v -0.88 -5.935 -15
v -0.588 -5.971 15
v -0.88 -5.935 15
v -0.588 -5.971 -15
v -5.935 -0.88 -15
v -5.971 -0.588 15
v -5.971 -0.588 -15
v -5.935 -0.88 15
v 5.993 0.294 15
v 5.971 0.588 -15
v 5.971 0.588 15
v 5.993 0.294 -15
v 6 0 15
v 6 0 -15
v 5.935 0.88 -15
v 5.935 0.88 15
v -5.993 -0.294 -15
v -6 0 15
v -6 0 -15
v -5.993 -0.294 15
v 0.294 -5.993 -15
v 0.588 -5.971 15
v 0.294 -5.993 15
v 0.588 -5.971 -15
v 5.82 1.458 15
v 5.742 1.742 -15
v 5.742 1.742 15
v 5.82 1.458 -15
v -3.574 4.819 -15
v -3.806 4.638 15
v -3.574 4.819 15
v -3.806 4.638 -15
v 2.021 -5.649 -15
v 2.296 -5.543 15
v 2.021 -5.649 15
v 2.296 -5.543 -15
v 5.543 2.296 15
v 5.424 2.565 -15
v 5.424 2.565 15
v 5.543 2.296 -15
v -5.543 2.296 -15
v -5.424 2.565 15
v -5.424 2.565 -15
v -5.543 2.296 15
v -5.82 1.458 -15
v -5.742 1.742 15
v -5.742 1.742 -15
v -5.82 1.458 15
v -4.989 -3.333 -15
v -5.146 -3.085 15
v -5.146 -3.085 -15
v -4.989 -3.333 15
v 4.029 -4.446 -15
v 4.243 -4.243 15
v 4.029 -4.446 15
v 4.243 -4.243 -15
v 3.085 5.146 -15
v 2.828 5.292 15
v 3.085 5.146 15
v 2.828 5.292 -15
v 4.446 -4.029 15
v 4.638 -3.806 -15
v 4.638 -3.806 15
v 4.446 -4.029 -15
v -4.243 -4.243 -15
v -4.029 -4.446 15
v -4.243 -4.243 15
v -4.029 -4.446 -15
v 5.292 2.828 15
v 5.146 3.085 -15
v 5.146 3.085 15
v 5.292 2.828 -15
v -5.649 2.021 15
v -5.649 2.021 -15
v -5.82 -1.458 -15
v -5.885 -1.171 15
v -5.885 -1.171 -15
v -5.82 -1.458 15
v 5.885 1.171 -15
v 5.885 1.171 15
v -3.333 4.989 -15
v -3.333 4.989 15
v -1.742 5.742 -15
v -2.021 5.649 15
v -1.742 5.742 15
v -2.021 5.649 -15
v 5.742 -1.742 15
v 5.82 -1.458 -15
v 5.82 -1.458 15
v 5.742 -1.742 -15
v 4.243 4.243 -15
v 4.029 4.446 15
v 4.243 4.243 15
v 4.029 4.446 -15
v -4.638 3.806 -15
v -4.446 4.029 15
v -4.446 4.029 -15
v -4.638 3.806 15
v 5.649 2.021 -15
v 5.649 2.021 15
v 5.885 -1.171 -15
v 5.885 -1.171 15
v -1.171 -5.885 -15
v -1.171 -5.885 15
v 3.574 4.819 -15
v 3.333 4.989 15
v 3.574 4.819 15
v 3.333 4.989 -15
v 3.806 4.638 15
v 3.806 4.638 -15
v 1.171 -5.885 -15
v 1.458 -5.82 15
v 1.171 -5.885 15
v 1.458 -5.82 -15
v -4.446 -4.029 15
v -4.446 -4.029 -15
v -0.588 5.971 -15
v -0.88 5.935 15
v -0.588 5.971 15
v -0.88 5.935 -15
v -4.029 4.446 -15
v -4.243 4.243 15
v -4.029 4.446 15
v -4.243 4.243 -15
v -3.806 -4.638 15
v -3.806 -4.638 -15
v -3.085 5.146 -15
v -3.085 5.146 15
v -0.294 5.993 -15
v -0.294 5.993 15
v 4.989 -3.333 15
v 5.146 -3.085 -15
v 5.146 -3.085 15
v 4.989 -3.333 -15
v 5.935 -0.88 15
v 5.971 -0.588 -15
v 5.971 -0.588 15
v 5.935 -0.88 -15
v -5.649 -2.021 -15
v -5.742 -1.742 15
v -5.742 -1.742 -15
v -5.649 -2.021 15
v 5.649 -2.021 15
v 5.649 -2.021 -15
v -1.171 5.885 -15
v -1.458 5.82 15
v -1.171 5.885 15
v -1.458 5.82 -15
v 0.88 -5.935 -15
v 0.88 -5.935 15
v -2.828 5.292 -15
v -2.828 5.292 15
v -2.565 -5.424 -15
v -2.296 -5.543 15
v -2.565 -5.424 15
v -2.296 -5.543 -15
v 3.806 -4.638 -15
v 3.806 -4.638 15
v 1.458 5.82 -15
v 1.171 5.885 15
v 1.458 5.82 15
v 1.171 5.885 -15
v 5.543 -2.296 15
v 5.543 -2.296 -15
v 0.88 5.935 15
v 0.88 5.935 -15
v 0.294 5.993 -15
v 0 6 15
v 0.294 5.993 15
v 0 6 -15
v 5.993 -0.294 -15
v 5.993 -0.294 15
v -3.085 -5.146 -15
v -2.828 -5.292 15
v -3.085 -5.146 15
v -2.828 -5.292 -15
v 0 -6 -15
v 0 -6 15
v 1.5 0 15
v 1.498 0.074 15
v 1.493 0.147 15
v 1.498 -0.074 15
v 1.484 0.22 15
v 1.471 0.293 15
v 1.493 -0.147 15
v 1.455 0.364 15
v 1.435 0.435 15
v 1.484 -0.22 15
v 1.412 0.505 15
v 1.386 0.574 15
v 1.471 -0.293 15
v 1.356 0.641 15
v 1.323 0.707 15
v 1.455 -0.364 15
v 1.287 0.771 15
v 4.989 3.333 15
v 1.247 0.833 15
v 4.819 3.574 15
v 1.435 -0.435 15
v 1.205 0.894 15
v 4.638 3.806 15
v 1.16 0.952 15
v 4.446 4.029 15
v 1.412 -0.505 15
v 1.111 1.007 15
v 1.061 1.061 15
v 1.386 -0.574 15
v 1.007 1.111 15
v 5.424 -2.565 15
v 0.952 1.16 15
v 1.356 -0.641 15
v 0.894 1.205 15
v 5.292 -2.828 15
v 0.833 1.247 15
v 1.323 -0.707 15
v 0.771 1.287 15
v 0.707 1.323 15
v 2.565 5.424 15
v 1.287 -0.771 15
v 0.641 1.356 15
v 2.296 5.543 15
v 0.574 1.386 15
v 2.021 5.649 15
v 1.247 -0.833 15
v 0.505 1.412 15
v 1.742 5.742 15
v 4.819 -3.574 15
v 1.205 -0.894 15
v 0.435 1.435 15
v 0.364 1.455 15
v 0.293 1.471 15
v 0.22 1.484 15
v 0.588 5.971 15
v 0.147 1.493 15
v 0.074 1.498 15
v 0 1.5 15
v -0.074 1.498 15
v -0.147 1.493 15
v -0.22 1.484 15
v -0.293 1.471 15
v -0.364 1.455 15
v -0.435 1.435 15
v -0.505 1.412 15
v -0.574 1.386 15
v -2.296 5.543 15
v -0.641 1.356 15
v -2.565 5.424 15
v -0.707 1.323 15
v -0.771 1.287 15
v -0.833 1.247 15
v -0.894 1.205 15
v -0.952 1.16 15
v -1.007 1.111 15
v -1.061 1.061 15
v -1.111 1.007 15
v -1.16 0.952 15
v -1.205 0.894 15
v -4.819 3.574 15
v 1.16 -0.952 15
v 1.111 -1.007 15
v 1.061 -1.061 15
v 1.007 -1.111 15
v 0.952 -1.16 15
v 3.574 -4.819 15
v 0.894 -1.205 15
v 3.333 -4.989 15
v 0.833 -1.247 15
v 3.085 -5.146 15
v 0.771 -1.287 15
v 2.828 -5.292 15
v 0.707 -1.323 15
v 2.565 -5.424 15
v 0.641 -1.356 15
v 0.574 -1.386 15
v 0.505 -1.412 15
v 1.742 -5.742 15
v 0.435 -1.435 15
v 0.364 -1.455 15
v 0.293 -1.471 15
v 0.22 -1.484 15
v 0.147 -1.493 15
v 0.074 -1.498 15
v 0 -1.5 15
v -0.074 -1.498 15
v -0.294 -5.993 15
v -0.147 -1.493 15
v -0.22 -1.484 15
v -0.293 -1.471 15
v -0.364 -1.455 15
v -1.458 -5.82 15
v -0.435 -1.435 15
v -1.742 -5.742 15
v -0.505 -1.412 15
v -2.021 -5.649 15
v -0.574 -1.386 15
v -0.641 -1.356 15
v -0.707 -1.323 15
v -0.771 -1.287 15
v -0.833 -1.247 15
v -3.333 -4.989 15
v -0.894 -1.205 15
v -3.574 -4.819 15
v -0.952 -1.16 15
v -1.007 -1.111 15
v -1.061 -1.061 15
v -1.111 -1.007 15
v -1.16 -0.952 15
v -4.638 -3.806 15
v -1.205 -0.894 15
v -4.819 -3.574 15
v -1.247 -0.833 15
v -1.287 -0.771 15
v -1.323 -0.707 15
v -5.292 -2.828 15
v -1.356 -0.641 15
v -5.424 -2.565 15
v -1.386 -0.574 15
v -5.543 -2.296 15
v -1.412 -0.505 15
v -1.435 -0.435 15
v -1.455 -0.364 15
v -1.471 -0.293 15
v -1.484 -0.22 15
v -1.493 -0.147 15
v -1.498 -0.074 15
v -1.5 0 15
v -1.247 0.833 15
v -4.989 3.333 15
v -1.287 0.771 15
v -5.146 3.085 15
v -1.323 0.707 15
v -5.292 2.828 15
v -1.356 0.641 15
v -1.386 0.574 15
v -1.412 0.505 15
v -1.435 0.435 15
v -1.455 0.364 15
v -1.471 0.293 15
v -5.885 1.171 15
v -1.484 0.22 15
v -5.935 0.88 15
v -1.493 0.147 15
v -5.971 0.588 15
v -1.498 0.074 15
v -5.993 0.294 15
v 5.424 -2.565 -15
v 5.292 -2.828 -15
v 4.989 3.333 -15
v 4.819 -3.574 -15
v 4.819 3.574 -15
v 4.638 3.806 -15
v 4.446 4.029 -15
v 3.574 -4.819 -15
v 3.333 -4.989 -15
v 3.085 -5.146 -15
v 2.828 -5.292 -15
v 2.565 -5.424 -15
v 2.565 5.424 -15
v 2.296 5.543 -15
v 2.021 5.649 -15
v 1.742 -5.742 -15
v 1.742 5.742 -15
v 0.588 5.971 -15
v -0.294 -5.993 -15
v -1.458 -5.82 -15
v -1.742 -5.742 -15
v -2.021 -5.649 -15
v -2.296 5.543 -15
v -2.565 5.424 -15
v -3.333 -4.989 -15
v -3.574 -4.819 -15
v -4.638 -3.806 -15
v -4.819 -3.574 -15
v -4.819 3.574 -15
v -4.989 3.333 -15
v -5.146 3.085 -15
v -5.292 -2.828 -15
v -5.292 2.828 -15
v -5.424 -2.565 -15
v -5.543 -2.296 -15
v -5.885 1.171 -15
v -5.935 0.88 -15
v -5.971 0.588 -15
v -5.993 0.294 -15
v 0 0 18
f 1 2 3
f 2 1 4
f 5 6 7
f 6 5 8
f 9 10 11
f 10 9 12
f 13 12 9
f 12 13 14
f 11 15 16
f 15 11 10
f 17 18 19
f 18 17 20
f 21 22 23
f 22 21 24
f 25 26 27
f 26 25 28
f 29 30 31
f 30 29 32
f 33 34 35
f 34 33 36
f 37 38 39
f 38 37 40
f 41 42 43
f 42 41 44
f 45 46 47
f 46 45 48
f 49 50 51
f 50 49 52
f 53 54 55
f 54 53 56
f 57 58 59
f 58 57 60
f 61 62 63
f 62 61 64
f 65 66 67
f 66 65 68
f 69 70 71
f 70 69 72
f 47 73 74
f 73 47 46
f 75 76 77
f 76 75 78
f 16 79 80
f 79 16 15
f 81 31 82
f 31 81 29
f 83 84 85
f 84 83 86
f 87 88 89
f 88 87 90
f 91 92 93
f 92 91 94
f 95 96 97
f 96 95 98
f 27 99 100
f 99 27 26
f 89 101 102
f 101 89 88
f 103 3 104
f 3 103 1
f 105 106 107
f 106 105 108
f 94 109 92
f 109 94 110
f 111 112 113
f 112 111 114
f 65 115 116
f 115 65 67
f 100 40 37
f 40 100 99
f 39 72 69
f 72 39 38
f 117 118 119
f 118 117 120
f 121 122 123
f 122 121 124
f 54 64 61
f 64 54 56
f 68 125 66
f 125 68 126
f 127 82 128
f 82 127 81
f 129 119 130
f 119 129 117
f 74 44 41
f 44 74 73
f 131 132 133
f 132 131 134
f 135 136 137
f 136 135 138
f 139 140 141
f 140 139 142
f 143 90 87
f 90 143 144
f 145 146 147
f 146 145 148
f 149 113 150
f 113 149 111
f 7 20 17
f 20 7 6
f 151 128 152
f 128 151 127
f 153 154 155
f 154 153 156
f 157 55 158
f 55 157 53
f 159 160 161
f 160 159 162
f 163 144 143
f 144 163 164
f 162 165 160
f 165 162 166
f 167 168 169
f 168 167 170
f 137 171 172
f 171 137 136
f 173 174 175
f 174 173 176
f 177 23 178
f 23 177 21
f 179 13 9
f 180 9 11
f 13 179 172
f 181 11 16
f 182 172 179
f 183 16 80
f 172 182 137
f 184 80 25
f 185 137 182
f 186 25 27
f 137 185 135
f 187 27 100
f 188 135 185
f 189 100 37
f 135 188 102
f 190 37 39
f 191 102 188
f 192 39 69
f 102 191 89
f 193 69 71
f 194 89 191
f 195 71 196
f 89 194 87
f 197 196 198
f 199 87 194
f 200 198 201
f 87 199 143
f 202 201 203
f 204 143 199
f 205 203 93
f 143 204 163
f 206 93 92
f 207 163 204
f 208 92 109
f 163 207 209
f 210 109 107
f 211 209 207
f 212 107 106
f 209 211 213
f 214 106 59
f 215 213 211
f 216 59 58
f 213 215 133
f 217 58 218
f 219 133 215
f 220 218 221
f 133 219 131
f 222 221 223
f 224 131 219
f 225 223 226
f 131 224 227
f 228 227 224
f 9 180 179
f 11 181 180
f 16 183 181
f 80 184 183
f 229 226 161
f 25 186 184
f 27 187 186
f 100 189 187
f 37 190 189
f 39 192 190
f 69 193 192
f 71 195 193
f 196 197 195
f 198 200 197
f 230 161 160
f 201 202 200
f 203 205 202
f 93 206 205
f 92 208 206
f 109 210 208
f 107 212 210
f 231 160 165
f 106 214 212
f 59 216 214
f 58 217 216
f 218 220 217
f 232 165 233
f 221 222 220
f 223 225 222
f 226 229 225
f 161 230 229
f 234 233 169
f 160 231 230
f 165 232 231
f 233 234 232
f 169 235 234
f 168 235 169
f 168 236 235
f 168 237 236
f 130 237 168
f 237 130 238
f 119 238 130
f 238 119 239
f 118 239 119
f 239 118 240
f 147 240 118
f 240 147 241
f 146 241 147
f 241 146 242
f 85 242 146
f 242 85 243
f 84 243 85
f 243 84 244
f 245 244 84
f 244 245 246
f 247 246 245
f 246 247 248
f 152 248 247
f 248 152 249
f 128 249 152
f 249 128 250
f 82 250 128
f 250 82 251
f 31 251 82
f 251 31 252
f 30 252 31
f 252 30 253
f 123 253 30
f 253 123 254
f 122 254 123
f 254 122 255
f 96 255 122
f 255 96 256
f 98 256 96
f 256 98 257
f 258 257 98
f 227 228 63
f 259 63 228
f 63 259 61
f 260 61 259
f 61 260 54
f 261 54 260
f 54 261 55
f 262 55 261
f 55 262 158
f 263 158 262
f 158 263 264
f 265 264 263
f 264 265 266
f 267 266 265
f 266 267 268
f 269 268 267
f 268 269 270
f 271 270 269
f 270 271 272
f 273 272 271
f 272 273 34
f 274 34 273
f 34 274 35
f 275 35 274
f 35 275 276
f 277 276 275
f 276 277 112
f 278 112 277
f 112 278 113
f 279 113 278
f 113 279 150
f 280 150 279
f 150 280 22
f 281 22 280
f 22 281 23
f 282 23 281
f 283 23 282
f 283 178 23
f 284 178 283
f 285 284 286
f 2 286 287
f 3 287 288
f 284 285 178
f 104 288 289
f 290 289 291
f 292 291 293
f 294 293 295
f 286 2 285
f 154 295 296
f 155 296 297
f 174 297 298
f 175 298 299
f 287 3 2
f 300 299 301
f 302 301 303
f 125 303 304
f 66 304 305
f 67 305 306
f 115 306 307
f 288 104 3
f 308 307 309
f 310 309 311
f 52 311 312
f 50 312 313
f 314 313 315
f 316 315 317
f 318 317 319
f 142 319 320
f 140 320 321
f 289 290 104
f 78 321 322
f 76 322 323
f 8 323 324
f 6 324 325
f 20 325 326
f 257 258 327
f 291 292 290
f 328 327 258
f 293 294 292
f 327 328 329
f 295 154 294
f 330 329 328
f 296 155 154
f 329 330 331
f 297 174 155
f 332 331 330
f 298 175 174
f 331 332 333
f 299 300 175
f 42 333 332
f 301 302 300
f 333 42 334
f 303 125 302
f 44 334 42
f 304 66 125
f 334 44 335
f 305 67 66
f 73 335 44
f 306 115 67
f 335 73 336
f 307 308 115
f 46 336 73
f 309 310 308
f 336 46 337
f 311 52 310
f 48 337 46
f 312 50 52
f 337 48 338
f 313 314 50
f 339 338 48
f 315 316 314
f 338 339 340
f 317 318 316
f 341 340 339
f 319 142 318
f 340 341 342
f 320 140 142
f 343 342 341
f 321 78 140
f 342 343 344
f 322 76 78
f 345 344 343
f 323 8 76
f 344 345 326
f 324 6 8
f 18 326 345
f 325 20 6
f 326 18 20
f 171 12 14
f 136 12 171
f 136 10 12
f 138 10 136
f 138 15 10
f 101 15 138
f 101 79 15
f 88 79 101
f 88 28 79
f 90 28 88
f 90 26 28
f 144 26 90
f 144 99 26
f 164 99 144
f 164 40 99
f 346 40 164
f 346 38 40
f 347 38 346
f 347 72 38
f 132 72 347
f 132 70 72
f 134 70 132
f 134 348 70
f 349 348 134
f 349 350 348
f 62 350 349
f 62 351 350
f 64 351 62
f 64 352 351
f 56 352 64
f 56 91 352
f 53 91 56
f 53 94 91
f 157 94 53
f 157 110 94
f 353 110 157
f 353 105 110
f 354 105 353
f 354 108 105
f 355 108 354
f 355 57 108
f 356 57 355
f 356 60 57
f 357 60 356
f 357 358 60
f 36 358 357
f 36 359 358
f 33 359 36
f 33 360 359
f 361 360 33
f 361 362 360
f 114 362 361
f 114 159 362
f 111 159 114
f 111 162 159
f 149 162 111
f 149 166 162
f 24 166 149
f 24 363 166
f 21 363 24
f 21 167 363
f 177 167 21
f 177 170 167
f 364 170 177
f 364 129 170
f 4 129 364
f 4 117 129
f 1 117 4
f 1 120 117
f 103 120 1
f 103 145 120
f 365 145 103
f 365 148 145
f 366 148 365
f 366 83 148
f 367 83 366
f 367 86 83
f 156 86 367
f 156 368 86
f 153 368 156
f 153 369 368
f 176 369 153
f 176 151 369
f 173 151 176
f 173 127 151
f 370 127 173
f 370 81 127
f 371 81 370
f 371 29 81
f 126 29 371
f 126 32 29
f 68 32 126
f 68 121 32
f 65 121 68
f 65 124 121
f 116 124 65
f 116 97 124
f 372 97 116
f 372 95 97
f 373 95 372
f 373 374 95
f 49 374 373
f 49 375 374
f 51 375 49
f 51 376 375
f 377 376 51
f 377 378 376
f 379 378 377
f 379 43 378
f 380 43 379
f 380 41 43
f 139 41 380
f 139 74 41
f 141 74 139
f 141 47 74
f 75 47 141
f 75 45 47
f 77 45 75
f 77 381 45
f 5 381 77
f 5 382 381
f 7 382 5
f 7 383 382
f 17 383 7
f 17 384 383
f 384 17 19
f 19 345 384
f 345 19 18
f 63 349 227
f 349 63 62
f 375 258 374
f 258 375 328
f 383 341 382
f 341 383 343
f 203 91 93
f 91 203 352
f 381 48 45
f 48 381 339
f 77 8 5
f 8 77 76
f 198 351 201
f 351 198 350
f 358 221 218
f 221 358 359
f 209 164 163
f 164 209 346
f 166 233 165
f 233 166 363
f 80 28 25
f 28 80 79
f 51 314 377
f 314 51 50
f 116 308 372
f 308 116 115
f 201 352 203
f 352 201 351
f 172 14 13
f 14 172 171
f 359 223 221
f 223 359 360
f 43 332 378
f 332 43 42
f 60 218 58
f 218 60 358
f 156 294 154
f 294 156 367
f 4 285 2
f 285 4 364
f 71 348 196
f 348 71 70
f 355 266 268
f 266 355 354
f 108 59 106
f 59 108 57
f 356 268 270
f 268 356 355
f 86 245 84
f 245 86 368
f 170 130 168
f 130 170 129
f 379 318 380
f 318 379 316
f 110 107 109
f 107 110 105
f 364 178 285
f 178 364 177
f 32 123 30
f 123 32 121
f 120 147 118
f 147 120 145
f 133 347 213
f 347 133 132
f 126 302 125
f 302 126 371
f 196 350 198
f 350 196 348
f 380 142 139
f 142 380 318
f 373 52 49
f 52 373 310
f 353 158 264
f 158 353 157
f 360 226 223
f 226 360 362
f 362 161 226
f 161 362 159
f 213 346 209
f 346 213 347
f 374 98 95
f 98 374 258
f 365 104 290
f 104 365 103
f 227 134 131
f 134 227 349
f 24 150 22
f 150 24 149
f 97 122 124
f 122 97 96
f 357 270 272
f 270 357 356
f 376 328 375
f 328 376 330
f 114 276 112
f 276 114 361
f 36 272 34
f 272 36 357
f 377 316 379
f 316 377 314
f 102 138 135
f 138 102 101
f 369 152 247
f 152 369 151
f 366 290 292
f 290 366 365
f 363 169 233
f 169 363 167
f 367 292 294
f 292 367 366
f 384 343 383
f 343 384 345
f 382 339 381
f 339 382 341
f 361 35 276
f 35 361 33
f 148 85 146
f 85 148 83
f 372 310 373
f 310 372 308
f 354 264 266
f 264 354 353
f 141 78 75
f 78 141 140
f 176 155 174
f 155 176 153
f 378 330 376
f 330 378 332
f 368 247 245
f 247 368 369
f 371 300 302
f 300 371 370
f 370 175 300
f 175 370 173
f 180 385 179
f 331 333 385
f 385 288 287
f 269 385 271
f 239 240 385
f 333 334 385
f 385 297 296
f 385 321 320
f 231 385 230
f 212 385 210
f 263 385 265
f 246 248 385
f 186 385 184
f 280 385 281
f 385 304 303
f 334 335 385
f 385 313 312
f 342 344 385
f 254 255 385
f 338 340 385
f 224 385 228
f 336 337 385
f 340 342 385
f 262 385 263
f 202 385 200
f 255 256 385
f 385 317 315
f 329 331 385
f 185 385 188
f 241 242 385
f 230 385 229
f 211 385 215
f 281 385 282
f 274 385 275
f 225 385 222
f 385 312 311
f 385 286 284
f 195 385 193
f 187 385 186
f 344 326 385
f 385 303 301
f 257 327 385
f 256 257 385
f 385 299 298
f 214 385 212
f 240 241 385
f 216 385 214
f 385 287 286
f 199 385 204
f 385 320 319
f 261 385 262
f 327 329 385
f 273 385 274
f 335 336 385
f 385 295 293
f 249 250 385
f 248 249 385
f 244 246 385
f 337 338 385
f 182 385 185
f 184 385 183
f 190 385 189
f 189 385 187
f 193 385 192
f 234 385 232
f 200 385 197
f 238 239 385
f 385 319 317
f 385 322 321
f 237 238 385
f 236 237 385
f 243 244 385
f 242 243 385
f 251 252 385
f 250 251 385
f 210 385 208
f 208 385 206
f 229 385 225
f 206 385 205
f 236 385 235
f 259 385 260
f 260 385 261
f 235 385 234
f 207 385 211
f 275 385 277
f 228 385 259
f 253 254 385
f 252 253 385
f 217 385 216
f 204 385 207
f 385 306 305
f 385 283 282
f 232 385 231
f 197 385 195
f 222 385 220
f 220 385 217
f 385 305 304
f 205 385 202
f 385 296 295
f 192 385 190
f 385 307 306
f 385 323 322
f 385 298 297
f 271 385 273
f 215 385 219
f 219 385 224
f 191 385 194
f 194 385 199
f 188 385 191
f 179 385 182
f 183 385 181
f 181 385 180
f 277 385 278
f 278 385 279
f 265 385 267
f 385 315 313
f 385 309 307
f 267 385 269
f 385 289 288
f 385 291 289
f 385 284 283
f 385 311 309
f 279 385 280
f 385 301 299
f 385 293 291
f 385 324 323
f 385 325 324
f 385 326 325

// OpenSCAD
// =====================================
// Generated by Autonomous CAD Agent
// Geometry Engine v5.0 (Aero-Structural)
// =====================================

$fn = 128;


union() {
  cylinder(r=6.0, h=30.0, center=true);
  translate([0,0,6.0])
  cylinder(h=12.0, r1=6.0, r2=0);

  cylinder(h=30.0, r1=6.0, r2=4.5, center=true);

  translate([0,0,-15.0])
  cylinder(h=10.0, r1=4.199999999999999, r2=1.2000000000000002);
}
